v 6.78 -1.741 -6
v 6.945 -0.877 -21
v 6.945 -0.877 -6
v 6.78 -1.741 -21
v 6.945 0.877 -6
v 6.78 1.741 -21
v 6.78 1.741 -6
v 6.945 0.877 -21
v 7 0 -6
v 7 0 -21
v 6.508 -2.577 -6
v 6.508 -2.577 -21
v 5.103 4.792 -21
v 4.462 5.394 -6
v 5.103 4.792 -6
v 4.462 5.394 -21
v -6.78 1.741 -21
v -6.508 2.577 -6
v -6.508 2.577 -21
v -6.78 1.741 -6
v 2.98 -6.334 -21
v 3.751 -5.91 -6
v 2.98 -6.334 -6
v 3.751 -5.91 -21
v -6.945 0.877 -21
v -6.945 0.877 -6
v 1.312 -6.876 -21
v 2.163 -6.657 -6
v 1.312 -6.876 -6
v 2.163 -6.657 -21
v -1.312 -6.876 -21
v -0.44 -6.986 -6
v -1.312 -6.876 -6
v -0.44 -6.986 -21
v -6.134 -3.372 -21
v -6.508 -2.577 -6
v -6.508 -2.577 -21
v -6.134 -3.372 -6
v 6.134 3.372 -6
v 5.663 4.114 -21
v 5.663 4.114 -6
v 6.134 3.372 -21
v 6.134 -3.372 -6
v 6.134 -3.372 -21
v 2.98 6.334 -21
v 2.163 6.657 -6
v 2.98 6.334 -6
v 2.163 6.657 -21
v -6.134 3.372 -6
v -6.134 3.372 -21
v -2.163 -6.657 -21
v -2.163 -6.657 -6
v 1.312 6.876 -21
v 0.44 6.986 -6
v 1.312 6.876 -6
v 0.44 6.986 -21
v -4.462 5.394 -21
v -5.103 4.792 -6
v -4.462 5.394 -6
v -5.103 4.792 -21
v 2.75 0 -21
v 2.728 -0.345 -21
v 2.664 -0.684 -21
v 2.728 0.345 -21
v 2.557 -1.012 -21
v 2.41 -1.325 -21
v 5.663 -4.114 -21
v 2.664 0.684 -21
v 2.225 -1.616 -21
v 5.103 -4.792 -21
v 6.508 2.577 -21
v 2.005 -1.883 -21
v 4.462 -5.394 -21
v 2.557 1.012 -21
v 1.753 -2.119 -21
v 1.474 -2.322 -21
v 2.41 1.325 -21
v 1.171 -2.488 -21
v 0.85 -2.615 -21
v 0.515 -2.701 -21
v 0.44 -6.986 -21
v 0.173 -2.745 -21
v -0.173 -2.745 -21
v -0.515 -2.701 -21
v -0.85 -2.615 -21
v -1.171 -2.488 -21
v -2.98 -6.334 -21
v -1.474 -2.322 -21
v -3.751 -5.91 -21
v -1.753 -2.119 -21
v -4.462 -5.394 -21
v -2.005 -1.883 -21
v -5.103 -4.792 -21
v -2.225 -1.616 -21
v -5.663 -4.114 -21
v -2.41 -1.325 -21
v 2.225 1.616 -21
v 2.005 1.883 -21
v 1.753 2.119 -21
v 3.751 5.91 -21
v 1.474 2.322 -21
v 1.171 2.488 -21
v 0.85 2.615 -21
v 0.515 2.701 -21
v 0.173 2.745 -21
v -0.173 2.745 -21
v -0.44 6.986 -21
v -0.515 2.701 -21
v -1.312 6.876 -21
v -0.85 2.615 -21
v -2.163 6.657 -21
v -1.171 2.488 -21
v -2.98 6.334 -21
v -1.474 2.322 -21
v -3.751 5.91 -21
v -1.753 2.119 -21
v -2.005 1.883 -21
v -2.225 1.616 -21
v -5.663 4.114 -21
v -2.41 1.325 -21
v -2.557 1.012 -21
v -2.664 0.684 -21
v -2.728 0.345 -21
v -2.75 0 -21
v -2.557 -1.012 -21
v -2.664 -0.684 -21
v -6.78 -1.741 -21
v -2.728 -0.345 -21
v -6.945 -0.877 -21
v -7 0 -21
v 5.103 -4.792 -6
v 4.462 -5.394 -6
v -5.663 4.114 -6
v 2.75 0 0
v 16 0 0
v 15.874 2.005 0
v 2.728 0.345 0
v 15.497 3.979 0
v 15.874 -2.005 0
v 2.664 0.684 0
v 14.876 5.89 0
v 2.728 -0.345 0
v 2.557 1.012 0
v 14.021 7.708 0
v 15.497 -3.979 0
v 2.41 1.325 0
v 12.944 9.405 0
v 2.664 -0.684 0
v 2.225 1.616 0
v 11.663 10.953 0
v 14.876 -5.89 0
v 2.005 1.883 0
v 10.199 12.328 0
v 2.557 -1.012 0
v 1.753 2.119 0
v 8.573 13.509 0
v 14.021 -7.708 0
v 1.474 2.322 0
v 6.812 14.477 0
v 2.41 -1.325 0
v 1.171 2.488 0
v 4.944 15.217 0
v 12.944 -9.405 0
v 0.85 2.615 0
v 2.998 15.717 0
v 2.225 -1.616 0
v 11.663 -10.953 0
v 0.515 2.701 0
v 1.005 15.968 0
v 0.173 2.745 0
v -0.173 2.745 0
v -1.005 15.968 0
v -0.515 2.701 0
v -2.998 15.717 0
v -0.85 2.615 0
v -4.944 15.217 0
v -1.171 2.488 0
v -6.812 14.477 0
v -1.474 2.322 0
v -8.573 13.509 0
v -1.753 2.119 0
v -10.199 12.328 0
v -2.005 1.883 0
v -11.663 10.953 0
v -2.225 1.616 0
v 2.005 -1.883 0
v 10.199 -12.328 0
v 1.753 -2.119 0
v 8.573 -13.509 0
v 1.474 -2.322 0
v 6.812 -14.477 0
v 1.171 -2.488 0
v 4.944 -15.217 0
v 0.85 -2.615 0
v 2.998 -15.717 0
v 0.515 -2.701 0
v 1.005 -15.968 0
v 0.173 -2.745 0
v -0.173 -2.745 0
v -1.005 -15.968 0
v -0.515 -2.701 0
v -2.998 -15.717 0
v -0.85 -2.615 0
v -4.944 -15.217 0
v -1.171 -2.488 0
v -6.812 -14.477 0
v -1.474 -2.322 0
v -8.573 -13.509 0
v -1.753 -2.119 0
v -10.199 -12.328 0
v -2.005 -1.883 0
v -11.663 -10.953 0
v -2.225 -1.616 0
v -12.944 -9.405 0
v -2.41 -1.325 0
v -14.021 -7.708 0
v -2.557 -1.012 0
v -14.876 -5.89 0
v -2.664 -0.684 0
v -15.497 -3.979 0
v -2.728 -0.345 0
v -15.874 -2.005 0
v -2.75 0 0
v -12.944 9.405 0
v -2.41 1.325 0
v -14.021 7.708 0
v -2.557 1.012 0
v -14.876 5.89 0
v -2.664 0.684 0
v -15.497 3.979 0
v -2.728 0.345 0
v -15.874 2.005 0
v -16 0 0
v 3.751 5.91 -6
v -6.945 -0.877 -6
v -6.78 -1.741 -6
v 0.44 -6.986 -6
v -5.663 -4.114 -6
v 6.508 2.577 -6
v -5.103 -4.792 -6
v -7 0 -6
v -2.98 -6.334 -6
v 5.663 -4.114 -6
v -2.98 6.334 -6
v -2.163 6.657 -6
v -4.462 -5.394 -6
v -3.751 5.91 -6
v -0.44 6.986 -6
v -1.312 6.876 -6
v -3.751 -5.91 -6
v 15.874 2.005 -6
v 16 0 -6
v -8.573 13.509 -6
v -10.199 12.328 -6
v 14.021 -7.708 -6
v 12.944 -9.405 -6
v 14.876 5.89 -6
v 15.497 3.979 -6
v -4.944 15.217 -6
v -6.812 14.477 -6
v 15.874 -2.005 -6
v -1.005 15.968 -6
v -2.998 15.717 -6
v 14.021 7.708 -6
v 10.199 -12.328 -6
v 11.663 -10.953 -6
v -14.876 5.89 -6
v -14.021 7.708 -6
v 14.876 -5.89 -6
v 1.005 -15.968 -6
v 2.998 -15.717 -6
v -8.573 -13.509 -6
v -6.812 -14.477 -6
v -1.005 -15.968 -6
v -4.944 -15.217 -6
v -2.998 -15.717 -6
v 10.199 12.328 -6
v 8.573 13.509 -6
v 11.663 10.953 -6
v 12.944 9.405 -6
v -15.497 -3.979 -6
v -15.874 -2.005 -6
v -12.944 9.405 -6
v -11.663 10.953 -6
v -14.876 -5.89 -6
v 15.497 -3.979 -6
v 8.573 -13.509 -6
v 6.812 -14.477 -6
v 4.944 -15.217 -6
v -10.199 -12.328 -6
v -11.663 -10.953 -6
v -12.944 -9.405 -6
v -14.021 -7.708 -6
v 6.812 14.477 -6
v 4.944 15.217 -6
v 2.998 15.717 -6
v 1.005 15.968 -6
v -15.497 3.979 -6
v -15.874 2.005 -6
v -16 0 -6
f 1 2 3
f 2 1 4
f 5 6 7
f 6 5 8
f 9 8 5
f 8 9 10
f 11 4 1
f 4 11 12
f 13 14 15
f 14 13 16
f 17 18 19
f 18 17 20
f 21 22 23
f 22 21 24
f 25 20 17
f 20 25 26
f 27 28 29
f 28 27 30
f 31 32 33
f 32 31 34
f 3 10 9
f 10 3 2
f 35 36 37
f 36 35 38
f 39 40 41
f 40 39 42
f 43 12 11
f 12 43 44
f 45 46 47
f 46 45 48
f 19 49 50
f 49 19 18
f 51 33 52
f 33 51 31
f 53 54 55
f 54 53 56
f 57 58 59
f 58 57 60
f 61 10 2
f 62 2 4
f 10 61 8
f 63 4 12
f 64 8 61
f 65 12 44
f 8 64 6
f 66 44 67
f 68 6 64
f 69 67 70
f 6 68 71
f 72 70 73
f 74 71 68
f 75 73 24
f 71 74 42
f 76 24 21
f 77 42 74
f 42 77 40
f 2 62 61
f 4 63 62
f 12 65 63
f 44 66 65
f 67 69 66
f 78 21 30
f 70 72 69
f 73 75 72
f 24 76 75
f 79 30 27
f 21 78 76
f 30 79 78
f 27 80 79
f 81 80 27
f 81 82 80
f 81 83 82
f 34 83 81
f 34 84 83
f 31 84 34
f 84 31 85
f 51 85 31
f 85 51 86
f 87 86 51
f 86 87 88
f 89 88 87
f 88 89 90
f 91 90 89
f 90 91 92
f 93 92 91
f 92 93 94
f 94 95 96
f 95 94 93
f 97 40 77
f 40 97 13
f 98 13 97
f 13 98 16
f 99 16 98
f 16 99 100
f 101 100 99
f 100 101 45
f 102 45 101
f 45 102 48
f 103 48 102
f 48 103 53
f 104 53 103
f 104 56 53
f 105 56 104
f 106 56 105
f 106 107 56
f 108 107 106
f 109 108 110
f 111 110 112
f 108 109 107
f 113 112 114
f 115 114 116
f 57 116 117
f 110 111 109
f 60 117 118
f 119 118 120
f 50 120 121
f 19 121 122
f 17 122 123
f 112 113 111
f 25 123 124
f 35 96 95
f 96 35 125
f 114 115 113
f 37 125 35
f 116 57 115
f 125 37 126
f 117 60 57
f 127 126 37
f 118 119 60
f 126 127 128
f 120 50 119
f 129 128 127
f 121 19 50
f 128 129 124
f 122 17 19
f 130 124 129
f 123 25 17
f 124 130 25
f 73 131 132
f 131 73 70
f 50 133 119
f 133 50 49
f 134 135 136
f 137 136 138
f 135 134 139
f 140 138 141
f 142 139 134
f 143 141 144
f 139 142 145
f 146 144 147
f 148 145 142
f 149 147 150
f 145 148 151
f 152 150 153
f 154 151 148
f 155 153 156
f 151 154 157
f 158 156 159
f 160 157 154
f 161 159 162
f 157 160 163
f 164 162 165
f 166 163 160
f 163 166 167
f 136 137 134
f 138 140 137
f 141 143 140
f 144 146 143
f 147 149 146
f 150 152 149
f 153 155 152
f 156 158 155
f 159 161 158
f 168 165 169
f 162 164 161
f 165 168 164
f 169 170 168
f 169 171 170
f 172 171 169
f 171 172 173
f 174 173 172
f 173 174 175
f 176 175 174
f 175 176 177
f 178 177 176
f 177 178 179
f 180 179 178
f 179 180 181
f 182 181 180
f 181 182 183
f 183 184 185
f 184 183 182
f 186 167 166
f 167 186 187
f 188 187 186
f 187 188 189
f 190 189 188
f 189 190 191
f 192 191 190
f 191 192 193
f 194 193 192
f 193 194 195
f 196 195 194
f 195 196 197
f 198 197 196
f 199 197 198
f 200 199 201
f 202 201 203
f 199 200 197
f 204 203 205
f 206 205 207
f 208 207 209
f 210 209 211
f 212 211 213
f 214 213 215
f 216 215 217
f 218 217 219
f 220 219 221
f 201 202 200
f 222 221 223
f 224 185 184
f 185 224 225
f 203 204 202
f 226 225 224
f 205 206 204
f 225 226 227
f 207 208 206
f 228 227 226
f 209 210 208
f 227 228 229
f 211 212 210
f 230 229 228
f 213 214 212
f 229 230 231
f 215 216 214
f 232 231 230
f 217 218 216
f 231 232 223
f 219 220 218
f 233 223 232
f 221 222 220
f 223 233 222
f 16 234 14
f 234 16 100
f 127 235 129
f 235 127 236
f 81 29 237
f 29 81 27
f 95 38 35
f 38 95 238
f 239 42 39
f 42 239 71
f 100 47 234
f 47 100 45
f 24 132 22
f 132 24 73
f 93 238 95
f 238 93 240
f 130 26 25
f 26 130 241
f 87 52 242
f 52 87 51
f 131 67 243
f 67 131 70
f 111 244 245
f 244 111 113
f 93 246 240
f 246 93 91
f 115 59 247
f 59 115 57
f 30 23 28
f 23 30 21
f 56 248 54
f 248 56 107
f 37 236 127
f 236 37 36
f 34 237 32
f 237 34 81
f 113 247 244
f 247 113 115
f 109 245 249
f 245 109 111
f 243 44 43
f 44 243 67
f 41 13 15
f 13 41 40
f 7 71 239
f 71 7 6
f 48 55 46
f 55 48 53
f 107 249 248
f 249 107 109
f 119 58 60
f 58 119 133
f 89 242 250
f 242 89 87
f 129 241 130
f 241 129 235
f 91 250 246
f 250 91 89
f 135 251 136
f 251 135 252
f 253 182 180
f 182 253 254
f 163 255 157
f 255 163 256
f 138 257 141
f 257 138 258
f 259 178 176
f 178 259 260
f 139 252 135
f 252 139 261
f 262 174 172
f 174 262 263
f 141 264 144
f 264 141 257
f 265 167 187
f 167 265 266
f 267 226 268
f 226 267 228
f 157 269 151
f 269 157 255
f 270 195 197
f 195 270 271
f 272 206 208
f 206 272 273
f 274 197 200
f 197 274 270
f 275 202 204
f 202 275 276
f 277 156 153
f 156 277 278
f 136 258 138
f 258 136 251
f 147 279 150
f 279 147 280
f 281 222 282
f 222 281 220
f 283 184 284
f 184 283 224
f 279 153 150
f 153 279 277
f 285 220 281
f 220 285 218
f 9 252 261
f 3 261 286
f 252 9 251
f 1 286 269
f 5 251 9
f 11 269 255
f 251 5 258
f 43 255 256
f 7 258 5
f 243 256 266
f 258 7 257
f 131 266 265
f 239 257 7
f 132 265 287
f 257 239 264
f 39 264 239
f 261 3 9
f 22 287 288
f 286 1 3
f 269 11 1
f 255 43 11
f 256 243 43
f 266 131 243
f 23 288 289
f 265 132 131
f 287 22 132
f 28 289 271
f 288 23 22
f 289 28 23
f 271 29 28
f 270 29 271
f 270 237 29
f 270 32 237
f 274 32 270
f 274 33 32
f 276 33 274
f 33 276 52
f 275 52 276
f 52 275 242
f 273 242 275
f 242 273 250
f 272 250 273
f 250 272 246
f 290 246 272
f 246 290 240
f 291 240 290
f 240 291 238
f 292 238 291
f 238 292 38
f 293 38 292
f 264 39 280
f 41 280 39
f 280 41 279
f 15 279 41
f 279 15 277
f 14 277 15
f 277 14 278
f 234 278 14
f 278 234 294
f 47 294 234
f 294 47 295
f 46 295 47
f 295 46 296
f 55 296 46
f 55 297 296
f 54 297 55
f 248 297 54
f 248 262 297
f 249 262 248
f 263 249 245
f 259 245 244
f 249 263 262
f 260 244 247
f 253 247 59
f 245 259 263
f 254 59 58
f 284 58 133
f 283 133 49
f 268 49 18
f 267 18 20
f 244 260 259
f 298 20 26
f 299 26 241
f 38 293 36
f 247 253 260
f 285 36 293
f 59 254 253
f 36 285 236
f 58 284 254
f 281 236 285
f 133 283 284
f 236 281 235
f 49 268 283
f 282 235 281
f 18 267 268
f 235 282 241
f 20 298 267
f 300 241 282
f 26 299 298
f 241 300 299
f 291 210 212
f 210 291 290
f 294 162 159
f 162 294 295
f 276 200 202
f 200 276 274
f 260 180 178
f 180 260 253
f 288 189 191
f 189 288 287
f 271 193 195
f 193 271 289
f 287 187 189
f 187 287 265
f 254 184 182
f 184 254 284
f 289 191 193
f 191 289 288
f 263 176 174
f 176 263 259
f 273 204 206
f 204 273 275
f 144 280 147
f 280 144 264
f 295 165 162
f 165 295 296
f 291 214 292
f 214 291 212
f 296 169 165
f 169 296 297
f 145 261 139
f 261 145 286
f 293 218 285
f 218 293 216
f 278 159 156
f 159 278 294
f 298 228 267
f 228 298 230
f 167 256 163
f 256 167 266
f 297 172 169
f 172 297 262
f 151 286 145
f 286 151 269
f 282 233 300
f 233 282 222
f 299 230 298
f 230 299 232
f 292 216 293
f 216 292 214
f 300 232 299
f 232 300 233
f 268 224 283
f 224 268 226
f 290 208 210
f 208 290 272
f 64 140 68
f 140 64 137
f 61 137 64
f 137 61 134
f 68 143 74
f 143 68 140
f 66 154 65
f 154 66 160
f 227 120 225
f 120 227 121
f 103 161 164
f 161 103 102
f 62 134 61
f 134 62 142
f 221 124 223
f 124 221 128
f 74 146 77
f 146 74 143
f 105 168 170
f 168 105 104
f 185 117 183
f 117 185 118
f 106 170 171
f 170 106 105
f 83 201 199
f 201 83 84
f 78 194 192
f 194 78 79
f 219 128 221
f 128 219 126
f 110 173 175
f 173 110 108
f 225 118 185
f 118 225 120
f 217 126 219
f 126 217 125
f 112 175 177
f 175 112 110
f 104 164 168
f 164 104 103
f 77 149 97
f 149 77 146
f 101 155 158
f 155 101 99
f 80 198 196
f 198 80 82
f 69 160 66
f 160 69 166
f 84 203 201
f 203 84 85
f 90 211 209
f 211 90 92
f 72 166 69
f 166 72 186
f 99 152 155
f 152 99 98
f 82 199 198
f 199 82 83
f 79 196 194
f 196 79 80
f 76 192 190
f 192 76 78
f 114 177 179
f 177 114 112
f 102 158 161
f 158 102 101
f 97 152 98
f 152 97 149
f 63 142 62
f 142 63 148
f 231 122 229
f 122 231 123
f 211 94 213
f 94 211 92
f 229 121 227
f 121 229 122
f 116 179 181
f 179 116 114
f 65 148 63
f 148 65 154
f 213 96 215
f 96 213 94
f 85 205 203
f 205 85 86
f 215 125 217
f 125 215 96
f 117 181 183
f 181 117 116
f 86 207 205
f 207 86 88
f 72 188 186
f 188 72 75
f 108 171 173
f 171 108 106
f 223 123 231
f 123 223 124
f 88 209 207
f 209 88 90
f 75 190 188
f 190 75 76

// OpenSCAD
$fn = 50;


difference() {
	union() {
		translate(v = [0, 0, -21.0000000000]) {
			cylinder(h = 21, r = 7.0000000000);
		}
		translate(v = [0, 0, -6.0000000000]) {
			cylinder(h = 6, r = 16.0000000000);
		}
	}
	union() {
		#translate(v = [0, 0, -21]) {
			cylinder(h = 21, r = 2.7500000000);
		}
	}
}
